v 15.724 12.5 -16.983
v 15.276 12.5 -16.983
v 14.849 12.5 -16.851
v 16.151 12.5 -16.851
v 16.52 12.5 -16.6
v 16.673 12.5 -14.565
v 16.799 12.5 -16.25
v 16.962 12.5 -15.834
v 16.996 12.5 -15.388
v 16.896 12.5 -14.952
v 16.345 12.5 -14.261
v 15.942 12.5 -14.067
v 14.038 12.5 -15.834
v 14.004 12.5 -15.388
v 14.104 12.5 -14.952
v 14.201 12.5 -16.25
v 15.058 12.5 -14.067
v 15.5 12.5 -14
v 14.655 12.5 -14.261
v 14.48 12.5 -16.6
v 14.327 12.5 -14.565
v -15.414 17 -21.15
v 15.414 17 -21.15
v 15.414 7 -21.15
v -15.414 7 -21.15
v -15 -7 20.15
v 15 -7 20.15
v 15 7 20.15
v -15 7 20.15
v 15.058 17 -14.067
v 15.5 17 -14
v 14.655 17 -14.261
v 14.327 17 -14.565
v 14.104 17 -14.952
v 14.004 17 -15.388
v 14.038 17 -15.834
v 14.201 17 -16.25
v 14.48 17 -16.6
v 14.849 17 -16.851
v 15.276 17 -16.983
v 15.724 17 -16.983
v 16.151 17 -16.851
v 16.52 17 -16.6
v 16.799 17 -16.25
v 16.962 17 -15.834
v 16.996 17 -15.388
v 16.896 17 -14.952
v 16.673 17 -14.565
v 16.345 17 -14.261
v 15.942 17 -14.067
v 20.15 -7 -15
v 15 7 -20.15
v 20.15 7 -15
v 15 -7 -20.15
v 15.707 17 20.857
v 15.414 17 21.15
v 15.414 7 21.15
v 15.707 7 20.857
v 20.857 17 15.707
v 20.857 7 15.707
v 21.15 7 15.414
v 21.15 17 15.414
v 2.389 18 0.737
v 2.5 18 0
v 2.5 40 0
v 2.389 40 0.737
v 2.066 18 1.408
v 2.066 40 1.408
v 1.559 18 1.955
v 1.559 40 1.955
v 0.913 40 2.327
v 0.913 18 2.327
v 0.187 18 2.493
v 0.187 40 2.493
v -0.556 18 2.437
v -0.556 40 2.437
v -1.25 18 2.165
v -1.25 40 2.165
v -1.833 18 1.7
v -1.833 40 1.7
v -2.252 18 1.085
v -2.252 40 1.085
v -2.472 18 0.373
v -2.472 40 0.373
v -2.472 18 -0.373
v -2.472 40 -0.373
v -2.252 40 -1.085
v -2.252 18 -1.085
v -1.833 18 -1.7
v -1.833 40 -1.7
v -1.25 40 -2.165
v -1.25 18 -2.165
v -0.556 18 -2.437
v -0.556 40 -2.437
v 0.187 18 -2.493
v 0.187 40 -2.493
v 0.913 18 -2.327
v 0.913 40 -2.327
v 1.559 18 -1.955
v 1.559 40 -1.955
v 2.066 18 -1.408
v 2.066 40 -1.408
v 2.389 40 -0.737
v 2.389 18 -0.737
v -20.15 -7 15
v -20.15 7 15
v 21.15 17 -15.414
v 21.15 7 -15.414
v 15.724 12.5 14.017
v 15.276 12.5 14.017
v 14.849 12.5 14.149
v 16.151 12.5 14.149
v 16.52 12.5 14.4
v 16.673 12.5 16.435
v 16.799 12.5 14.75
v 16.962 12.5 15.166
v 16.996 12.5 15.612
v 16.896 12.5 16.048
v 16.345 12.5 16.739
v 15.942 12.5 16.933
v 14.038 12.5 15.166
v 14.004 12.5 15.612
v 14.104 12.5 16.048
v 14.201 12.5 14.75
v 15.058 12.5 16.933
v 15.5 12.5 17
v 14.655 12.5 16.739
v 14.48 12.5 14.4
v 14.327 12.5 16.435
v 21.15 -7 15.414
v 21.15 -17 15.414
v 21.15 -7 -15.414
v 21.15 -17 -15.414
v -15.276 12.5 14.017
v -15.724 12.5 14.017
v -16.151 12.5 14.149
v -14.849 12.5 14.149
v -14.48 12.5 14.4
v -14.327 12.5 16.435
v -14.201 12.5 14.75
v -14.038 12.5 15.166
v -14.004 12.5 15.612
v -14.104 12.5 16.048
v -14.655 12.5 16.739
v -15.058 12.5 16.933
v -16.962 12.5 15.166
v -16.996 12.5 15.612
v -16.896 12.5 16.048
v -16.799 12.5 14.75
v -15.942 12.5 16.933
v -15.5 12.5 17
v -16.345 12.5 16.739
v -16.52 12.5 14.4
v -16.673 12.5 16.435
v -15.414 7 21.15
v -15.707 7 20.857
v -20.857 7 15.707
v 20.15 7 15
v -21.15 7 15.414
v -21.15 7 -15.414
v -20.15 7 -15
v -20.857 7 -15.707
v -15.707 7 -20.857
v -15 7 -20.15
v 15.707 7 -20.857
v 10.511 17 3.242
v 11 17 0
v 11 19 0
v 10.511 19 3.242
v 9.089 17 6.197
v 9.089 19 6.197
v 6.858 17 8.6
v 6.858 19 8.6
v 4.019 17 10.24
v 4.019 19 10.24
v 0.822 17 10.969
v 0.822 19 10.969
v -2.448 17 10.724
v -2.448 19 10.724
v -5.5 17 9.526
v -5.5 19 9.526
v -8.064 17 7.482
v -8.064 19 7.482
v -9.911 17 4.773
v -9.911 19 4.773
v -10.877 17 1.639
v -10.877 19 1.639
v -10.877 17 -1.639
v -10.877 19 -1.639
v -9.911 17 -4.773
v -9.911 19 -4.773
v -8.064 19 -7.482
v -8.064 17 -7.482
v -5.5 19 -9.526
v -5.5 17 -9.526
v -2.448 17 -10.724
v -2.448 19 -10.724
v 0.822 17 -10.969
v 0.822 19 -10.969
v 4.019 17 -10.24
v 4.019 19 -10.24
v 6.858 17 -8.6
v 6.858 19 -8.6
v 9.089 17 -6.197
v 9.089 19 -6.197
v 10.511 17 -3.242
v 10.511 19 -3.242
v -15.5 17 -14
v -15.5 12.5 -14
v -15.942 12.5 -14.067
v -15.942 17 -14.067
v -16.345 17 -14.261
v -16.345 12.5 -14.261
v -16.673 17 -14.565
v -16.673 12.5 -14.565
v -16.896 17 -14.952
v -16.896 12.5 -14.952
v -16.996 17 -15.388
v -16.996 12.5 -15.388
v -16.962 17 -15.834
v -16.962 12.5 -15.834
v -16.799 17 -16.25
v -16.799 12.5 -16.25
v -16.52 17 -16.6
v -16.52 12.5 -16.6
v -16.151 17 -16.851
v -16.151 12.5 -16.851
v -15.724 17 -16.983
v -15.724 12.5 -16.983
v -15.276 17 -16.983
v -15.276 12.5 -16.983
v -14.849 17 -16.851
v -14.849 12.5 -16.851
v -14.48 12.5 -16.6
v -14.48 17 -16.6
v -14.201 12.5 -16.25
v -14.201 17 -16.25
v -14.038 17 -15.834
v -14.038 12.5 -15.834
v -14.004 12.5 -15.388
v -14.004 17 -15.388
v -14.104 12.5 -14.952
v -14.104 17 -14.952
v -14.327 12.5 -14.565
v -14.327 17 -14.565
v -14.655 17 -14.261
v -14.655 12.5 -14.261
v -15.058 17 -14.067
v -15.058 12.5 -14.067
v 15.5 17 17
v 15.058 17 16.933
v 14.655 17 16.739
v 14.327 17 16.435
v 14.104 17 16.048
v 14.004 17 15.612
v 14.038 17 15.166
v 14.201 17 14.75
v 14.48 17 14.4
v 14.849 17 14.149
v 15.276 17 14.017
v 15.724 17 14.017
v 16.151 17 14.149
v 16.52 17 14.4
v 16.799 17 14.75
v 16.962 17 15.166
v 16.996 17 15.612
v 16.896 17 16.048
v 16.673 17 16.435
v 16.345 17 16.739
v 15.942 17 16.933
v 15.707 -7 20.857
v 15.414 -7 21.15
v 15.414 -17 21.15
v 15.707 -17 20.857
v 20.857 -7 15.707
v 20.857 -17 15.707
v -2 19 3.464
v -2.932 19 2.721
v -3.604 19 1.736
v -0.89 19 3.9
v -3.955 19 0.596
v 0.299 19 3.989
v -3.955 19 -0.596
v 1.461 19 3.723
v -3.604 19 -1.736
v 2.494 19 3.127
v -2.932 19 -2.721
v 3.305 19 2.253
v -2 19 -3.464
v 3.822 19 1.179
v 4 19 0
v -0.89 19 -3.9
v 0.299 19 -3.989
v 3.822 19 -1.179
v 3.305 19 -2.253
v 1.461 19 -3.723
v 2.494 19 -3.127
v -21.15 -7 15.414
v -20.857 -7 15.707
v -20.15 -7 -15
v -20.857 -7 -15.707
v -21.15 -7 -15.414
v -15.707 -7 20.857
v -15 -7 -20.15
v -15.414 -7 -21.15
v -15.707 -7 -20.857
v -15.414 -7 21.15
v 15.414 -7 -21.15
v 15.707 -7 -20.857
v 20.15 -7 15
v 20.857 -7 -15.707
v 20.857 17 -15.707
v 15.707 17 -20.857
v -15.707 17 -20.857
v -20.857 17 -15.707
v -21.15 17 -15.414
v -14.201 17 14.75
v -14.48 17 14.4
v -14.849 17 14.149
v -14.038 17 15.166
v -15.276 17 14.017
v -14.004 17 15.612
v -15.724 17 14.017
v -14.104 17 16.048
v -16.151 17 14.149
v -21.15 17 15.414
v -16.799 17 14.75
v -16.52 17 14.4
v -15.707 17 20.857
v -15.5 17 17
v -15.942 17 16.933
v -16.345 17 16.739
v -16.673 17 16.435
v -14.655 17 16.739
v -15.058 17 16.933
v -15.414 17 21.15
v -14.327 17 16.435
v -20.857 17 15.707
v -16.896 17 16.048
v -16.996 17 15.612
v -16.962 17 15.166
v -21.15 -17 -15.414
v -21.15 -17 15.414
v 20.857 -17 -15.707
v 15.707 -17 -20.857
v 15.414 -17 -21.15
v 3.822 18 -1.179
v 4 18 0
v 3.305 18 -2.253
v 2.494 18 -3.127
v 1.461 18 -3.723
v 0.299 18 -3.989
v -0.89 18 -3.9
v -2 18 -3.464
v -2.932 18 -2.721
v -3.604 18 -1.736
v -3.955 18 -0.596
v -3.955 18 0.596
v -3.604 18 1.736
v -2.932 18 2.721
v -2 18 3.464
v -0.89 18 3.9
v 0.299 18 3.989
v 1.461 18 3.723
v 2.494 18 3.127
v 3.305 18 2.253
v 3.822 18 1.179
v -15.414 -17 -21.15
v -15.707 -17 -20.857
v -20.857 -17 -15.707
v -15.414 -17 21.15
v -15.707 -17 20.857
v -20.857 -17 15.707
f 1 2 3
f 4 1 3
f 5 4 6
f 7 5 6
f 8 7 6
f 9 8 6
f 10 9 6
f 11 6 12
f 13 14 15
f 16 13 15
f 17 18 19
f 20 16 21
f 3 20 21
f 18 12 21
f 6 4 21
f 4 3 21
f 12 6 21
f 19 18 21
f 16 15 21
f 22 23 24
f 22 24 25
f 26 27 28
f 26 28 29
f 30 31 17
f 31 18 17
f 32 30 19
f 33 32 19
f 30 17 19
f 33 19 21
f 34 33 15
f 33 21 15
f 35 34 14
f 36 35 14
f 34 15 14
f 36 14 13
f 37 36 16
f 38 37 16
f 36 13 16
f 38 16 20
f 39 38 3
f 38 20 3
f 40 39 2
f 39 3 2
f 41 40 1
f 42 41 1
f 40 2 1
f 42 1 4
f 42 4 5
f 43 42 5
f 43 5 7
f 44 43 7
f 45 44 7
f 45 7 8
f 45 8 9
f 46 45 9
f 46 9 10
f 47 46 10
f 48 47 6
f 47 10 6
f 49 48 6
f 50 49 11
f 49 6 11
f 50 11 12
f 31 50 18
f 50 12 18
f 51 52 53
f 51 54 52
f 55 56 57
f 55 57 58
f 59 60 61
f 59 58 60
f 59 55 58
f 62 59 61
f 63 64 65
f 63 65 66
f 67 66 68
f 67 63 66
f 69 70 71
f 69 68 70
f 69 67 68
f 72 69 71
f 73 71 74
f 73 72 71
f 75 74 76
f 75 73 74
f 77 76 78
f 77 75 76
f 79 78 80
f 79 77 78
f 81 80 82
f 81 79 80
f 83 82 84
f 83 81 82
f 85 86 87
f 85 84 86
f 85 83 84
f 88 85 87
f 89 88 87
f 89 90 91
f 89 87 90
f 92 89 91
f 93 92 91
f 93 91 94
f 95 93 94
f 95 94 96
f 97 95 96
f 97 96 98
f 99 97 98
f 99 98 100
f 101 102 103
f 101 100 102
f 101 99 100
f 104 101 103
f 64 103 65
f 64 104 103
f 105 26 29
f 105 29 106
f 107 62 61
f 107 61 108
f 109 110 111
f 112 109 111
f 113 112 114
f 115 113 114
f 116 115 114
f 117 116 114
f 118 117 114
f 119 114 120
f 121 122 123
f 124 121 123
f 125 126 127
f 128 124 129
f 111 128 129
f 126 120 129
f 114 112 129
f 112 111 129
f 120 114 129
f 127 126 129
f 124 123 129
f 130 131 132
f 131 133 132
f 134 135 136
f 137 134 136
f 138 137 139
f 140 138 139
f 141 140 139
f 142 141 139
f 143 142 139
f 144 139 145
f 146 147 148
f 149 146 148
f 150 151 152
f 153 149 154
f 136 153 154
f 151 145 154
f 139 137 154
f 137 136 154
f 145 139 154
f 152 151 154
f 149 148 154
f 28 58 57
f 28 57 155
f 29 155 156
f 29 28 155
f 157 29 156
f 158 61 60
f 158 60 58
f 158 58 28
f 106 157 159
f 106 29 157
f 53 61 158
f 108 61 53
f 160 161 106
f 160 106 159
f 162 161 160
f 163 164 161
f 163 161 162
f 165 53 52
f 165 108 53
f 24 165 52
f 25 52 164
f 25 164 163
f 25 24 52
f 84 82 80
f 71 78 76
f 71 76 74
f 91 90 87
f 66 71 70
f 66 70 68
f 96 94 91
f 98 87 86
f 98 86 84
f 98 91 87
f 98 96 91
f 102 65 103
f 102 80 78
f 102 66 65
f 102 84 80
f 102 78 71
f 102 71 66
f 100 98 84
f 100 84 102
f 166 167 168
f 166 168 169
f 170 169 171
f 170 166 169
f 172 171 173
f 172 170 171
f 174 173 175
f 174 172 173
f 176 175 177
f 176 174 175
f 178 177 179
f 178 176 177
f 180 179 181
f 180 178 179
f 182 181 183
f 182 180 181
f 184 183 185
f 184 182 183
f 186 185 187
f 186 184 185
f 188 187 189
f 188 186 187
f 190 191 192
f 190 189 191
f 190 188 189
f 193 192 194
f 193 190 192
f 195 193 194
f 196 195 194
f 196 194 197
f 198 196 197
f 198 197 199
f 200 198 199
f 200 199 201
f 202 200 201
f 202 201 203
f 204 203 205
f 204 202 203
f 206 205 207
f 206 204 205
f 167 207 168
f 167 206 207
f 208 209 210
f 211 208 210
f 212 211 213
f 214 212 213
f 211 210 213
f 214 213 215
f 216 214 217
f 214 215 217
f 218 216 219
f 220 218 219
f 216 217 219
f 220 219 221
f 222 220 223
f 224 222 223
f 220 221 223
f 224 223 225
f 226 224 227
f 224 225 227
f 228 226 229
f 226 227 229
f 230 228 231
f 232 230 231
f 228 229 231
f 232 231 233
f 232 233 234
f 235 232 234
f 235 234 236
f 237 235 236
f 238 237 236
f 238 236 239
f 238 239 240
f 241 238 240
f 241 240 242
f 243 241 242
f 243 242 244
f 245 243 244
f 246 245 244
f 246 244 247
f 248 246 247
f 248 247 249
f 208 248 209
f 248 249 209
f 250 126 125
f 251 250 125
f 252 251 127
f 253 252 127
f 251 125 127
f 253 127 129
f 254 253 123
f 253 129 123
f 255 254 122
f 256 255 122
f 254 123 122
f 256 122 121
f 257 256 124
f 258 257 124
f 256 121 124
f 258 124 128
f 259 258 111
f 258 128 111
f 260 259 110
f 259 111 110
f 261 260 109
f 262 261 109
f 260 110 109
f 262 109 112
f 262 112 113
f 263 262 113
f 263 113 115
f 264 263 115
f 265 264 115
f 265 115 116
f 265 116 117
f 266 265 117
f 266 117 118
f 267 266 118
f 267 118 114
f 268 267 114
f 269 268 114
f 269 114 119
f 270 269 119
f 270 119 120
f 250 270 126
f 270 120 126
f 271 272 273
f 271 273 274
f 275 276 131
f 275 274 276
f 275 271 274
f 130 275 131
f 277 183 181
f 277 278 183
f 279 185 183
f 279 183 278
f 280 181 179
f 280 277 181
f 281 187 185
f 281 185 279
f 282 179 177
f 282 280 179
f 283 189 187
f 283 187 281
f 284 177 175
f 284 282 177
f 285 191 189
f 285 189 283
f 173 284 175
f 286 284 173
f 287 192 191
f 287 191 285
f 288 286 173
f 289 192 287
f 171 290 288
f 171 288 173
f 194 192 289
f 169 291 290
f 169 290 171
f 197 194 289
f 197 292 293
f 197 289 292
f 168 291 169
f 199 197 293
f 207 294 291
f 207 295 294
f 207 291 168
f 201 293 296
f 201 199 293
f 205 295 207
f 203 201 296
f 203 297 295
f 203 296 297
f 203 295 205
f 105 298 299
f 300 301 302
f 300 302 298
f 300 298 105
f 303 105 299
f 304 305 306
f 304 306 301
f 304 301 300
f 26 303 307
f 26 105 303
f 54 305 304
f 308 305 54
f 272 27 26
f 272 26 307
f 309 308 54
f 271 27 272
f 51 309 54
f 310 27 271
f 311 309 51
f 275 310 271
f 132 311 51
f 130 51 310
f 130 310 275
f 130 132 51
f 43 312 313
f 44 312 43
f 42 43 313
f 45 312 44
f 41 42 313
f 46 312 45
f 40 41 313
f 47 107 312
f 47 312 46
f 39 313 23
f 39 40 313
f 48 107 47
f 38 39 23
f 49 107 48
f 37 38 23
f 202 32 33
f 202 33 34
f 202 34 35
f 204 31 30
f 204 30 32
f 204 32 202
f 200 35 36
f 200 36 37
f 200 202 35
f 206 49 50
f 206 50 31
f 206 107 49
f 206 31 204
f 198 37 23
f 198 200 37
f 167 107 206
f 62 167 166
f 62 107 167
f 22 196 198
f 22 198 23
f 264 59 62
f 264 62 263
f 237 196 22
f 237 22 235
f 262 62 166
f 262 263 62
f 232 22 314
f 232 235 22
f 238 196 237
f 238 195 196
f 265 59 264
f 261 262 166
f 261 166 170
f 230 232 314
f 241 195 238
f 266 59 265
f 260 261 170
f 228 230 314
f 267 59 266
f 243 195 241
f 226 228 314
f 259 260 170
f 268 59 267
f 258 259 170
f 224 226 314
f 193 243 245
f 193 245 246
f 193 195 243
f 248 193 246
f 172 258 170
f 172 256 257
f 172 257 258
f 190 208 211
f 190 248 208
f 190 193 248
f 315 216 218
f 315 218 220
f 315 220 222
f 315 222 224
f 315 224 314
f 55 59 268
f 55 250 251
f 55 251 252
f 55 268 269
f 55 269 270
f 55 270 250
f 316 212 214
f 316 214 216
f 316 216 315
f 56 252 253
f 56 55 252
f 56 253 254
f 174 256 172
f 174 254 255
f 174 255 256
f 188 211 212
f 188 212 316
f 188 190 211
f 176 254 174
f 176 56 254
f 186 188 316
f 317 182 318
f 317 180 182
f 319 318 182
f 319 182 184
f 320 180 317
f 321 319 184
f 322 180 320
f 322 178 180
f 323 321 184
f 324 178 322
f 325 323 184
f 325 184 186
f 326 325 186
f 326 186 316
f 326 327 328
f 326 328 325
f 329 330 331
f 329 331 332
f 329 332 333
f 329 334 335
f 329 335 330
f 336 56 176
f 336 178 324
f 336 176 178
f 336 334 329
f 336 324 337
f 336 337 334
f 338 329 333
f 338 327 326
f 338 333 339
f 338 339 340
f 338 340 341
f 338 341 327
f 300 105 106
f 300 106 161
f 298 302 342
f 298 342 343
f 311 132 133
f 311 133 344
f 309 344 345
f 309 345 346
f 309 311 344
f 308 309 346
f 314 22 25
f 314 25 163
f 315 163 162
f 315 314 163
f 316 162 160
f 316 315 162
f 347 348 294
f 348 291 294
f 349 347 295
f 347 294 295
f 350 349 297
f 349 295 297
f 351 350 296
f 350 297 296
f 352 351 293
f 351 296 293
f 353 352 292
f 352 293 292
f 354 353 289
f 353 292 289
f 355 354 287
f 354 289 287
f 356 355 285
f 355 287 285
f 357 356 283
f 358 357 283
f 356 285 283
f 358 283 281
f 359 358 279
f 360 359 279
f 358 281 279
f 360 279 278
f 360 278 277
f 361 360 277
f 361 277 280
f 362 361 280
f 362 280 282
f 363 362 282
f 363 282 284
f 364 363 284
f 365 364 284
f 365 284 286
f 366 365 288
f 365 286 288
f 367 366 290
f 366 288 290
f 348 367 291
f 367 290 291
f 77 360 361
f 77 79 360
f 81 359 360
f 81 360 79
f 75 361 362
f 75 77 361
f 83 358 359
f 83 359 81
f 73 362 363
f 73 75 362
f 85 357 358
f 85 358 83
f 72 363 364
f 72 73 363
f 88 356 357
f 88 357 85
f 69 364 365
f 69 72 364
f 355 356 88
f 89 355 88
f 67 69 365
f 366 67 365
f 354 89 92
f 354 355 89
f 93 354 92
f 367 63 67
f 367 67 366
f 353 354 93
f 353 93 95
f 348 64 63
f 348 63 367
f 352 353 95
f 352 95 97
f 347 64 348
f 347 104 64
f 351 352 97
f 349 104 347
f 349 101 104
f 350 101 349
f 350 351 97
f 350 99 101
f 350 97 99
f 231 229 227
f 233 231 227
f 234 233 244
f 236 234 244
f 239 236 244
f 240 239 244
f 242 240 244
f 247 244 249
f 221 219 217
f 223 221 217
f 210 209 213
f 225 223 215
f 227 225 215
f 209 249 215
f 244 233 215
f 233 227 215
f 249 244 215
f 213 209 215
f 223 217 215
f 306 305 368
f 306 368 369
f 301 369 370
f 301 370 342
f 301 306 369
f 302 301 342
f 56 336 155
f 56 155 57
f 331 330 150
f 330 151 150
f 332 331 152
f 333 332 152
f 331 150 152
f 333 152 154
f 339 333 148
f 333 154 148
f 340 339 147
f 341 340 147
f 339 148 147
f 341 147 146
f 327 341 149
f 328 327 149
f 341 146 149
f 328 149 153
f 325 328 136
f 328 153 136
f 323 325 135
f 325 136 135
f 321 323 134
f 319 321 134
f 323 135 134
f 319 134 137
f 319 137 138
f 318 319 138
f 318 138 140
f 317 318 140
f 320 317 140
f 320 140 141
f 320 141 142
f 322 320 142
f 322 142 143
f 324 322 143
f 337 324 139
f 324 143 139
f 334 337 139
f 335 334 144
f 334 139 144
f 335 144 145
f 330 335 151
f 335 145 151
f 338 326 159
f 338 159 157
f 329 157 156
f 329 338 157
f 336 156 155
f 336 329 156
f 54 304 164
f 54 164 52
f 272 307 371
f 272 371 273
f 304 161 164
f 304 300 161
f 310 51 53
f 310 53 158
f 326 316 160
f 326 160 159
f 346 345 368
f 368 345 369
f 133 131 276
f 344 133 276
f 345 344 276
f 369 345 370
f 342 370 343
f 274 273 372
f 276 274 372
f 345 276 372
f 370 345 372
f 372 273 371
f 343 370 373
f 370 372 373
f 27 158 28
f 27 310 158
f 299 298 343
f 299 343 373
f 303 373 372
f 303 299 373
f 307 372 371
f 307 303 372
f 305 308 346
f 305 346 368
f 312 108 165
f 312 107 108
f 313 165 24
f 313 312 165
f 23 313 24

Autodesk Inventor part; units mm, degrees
ref_plane "YZ Plane" through (0, 0, 0) normal (1, 0, 0) x (0, 1, 0)
ref_plane "XZ Plane" through (0, 0, 0) normal (0, 1, 0) x (-1, 0, 0)
ref_plane "XY Plane" through (0, 0, 0) normal (0, 0, 1) x (1, 0, 0)
sketch "Sketch2" plane through (0, 0, 0) normal (0, 1, 0) x (-1, 0, 0)
  line L0 (15, 20.15) -> (20.15, 15)
  line L1 (20.15, 15) -> (20.15, -15)
  line L2 (20.15, -15) -> (15, -20.15)
  line L3 (15, -20.15) -> (-15, -20.15)
  line L4 (-15, -20.15) -> (-20.15, -15)
  line L5 (-20.15, -15) -> (-20.15, 15)
  line L6 (-20.15, 15) -> (-15, 20.15)
  line L7 (-15, 20.15) -> (15, 20.15)
  point P0 (0, 0)
  point P1 (20.15, 0)
  point P2 (0, -20.15)
  dimension "d2" = 30
  dimension "d3" = 40.3
  dimension "d4" = 135
extrude "Extrusion1" add sketch "Sketch2" along normal mid plane 34
sketch "Sketch7" plane through (0, 17, 0) normal (0, 1, 0) x (1, 0, 0)
  circle A0 centre (0, 0) radius 11
  dimension "d27" = 22
extrude "Extrusion3" add sketch "Sketch7" along normal blind 2
sketch "Sketch8" plane through (0, 19, 0) normal (0, 1, 0) x (1, 0, 0)
  circle A0 centre (0, 0) radius 4
  dimension "d30" = 8
extrude "Extrusion4" cut sketch "Sketch8" against normal blind 1
sketch "Sketch9" plane through (0, 18, 0) normal (0, 1, 0) x (1, 0, 0)
  circle A0 centre (0, 0) radius 2.5
  dimension "d33" = 5
extrude "Extrusion5" add sketch "Sketch9" along normal blind 22
sketch "Sketch10" plane through (-15, 17, 20.15) normal (0, 0, 1) x (1, 0, 0)
  line L0 (30, 0) -> (30, -34) projected
  line L1 (0, 0) -> (30, 0) projected
  line L2 (0, -34) -> (0, 0) projected
  line L3 (30, -34) -> (0, -34) projected
  line L4 (0, 0) -> (30, 0)
  line L5 (30, 0) -> (30, -10)
  line L6 (30, -10) -> (0, -10)
  line L7 (0, -10) -> (0, 0)
  line L8 (0, 0) -> (30, -10) construction
  line L9 (30, 0) -> (0, -10) construction
  line L10 (0, -24) -> (30, -24)
  line L11 (30, -24) -> (30, -34)
  line L12 (30, -34) -> (0, -34)
  line L13 (0, -34) -> (0, -24)
  line L14 (0, -24) -> (30, -34) construction
  line L15 (30, -24) -> (0, -34) construction
  line L16 (0, 0) -> (30, 0) projected
  point P0 (15, -17)
  point P1 (15, -5)
  point P2 (15, -29)
  dimension "d36" = 10
  dimension "d37" = 10
extrude "Extrusion6" add sketch "Sketch10" along normal blind 1 contours L0 L6 L2 L1 | L0 L3 L2 L10
mirror "Mirror1" about plane through (0, 0, 0) normal (0, 0, 1) of "Extrusion6"
sketch "Sketch11" plane through (20.15, -17, -15) normal (1, 0, 0) x (0, 0, -1)
  line L0 (0, 34) -> (0, 0) projected
  line L1 (-30, 34) -> (0, 34) projected
  line L2 (-30, 34) -> (-30, 0) projected
  line L3 (0, 0) -> (-30, 0) projected
  line L4 (-30, 34) -> (0, 34)
  line L5 (0, 34) -> (0, 24)
  line L6 (0, 24) -> (-30, 24)
  line L7 (-30, 24) -> (-30, 34)
  line L8 (-30, 34) -> (0, 24) construction
  line L9 (0, 34) -> (-30, 24) construction
  line L10 (-30, 10) -> (0, 10)
  line L11 (0, 10) -> (0, 0)
  line L12 (0, 0) -> (-30, 0)
  line L13 (-30, 0) -> (-30, 10)
  line L14 (-30, 10) -> (0, 0) construction
  line L15 (0, 10) -> (-30, 0) construction
  line L16 (-30, 34) -> (0, 34) projected
  point P0 (-15, 17)
  point P1 (-15, 29)
  point P2 (-15, 5)
  dimension "d40" = 10
extrude "Extrusion7" add sketch "Sketch11" along normal blind 1 contours L0 L6 L2 L1 | L0 L3 L2 L10
mirror "Mirror2" about plane through (0, 0, 0) normal (1, 0, 0) of "Extrusion7"
sketch "Sketch12" plane through (-15, -7, 20.15) normal (-0.7071, 0, 0.7071) x (0.7071, 0, 0.7071)
  line L0 (0, -10) -> (0, 0) projected
  line L1 (0, 0) -> (0, 14) projected
  line L2 (0, 14) -> (0, 24) projected
  line L3 (-7.2832, 24) -> (0, 24) projected
  line L4 (-7.2832, 24) -> (-7.2832, 14) projected
  line L5 (-7.2832, 14) -> (-7.2832, 0) projected
  line L6 (-7.2832, 0) -> (-7.2832, -10) projected
  line L7 (0, -10) -> (-7.2832, -10) projected
  line L8 (-7.2832, 24) -> (0, 24)
  line L9 (0, 24) -> (0, 14)
  line L10 (0, 14) -> (-7.2832, 14)
  line L11 (-7.2832, 14) -> (-7.2832, 24)
  line L12 (-7.2832, 24) -> (0, 14) construction
  line L13 (0, 24) -> (-7.2832, 14) construction
  line L14 (-7.2832, 0) -> (0, 0)
  line L15 (0, 0) -> (0, -10)
  line L16 (0, -10) -> (-7.2832, -10)
  line L17 (-7.2832, -10) -> (-7.2832, 0)
  line L18 (-7.2832, 0) -> (0, -10) construction
  line L19 (0, 0) -> (-7.2832, -10) construction
  line L20 (-7.2832, 24) -> (0, 24) projected
  line L21 (0, -10) -> (-7.2832, -10) projected
  point P0 (-3.6416, 7)
  point P1 (-3.6416, 19)
  point P2 (-3.6416, -5)
  dimension "d43" = 10
  dimension "d44" = 10
extrude "Extrusion8" add sketch "Sketch12" along normal blind 1 contours L7 L6 L14 L0 | L10 L4 L3 L2
sketch "Sketch14" plane through (-15, 7, 21.15) normal (-1, 0, 0) x (0, 0, 1)
  line L0 (-1, 0) -> (-1, 10) projected
  line L1 (-1, 0) -> (0, 0) projected
  line L2 (0, 10) -> (0, 0) projected
  line L3 (-1, 10) -> (0, 10) projected
  line L4 (-1, -24) -> (-1, -14) projected
  line L5 (-1, -24) -> (0, -24) projected
  line L6 (0, -14) -> (0, -24) projected
  line L7 (-1, -14) -> (0, -14) projected
  point P0 (-21.15, -7)
extrude "Extrusion9" add sketch "Sketch14" along normal up to surface surface through (-18.2821, 12, 18.2821) normal (-0.7071, 0, 0.7071)
sketch "Sketch15" plane through (-21.15, 7, 15) normal (0, 0, 1) x (1, 0, 0)
  line L0 (1, 10) -> (1, 0) projected
  line L1 (1, 10) -> (0, 10) projected
  line L2 (0, 10) -> (0, 0) projected
  line L3 (1, 0) -> (0, 0) projected
  line L4 (1, -14) -> (1, -24) projected
  line L5 (1, -14) -> (0, -14) projected
  line L6 (0, -14) -> (0, -24) projected
  line L7 (1, -24) -> (0, -24) projected
  point P0 (21.15, -7)
extrude "Extrusion10" add sketch "Sketch15" along normal up to surface surface through (-18.2821, -12, 18.2821) normal (-0.7071, 0, 0.7071)
mirror "Mirror3" about plane through (0, 0, 0) normal (1, 0, 0) of "Extrusion8", "Extrusion9", "Extrusion10"
mirror "Mirror4" about plane through (0, 0, 0) normal (0, 0, 1) of "Extrusion8", "Extrusion9", "Extrusion10", "Mirror3"
sketch "Sketch17" plane through (0, 17, 0) normal (0, 1, 0) x (1, 0, 0)
  line L0 (-21.15, -15.4142) -> (-15.4142, -21.15) projected
  line L1 (-15.4142, -21.15) -> (15.4142, -21.15) projected
  line L2 (21.15, -15.4142) -> (15.4142, -21.15) projected
  line L3 (21.15, -15.4142) -> (21.15, 15.4142) projected
  line L4 (21.15, 15.4142) -> (15.4142, 21.15) projected
  line L5 (15.4142, 21.15) -> (-15.4142, 21.15) projected
  line L6 (-21.15, 15.4142) -> (-15.4142, 21.15) projected
  line L7 (-21.15, 15.4142) -> (-21.15, -15.4142) projected
  circle A0 centre (0, 0) radius 11 projected
  circle A1 centre (-15.5, -15.5) radius 1.5
  circle A2 centre (-15.5, 15.5) radius 1.5
  circle A3 centre (15.5, 15.5) radius 1.5
  circle A4 centre (15.5, -15.5) radius 1.5
  dimension "d53" = 3
  dimension "d54" = 31
  dimension "d55" = 31
  dimension "d57" = 15.5
  dimension "d66" = 15.5
hole "Hole3" at (-15.5, 17, 15.5) at (-15.5, 17, -15.5) at (15.5, 17, -15.5) at (15.5, 17, 15.5) direction (0, -1, 0) diameter 3 depth 4.5
ref_plane "Work Plane4" through (0, 18, 0) normal (1, 0, 0) x (0, 1, 0)
ref_plane "Work Plane1" through (0, 0, 0) normal (1, 0, 0) x (0, 1, 0)
ref_plane "Work Plane2" through (0, 0, 0) normal (-1, 0, 0) x (0, 1, 0)
ref_plane "Work Plane3" through (0, 0, 0) normal (-1, 0, 0) x (0, 1, 0)
properties part number "Motor_paso"
